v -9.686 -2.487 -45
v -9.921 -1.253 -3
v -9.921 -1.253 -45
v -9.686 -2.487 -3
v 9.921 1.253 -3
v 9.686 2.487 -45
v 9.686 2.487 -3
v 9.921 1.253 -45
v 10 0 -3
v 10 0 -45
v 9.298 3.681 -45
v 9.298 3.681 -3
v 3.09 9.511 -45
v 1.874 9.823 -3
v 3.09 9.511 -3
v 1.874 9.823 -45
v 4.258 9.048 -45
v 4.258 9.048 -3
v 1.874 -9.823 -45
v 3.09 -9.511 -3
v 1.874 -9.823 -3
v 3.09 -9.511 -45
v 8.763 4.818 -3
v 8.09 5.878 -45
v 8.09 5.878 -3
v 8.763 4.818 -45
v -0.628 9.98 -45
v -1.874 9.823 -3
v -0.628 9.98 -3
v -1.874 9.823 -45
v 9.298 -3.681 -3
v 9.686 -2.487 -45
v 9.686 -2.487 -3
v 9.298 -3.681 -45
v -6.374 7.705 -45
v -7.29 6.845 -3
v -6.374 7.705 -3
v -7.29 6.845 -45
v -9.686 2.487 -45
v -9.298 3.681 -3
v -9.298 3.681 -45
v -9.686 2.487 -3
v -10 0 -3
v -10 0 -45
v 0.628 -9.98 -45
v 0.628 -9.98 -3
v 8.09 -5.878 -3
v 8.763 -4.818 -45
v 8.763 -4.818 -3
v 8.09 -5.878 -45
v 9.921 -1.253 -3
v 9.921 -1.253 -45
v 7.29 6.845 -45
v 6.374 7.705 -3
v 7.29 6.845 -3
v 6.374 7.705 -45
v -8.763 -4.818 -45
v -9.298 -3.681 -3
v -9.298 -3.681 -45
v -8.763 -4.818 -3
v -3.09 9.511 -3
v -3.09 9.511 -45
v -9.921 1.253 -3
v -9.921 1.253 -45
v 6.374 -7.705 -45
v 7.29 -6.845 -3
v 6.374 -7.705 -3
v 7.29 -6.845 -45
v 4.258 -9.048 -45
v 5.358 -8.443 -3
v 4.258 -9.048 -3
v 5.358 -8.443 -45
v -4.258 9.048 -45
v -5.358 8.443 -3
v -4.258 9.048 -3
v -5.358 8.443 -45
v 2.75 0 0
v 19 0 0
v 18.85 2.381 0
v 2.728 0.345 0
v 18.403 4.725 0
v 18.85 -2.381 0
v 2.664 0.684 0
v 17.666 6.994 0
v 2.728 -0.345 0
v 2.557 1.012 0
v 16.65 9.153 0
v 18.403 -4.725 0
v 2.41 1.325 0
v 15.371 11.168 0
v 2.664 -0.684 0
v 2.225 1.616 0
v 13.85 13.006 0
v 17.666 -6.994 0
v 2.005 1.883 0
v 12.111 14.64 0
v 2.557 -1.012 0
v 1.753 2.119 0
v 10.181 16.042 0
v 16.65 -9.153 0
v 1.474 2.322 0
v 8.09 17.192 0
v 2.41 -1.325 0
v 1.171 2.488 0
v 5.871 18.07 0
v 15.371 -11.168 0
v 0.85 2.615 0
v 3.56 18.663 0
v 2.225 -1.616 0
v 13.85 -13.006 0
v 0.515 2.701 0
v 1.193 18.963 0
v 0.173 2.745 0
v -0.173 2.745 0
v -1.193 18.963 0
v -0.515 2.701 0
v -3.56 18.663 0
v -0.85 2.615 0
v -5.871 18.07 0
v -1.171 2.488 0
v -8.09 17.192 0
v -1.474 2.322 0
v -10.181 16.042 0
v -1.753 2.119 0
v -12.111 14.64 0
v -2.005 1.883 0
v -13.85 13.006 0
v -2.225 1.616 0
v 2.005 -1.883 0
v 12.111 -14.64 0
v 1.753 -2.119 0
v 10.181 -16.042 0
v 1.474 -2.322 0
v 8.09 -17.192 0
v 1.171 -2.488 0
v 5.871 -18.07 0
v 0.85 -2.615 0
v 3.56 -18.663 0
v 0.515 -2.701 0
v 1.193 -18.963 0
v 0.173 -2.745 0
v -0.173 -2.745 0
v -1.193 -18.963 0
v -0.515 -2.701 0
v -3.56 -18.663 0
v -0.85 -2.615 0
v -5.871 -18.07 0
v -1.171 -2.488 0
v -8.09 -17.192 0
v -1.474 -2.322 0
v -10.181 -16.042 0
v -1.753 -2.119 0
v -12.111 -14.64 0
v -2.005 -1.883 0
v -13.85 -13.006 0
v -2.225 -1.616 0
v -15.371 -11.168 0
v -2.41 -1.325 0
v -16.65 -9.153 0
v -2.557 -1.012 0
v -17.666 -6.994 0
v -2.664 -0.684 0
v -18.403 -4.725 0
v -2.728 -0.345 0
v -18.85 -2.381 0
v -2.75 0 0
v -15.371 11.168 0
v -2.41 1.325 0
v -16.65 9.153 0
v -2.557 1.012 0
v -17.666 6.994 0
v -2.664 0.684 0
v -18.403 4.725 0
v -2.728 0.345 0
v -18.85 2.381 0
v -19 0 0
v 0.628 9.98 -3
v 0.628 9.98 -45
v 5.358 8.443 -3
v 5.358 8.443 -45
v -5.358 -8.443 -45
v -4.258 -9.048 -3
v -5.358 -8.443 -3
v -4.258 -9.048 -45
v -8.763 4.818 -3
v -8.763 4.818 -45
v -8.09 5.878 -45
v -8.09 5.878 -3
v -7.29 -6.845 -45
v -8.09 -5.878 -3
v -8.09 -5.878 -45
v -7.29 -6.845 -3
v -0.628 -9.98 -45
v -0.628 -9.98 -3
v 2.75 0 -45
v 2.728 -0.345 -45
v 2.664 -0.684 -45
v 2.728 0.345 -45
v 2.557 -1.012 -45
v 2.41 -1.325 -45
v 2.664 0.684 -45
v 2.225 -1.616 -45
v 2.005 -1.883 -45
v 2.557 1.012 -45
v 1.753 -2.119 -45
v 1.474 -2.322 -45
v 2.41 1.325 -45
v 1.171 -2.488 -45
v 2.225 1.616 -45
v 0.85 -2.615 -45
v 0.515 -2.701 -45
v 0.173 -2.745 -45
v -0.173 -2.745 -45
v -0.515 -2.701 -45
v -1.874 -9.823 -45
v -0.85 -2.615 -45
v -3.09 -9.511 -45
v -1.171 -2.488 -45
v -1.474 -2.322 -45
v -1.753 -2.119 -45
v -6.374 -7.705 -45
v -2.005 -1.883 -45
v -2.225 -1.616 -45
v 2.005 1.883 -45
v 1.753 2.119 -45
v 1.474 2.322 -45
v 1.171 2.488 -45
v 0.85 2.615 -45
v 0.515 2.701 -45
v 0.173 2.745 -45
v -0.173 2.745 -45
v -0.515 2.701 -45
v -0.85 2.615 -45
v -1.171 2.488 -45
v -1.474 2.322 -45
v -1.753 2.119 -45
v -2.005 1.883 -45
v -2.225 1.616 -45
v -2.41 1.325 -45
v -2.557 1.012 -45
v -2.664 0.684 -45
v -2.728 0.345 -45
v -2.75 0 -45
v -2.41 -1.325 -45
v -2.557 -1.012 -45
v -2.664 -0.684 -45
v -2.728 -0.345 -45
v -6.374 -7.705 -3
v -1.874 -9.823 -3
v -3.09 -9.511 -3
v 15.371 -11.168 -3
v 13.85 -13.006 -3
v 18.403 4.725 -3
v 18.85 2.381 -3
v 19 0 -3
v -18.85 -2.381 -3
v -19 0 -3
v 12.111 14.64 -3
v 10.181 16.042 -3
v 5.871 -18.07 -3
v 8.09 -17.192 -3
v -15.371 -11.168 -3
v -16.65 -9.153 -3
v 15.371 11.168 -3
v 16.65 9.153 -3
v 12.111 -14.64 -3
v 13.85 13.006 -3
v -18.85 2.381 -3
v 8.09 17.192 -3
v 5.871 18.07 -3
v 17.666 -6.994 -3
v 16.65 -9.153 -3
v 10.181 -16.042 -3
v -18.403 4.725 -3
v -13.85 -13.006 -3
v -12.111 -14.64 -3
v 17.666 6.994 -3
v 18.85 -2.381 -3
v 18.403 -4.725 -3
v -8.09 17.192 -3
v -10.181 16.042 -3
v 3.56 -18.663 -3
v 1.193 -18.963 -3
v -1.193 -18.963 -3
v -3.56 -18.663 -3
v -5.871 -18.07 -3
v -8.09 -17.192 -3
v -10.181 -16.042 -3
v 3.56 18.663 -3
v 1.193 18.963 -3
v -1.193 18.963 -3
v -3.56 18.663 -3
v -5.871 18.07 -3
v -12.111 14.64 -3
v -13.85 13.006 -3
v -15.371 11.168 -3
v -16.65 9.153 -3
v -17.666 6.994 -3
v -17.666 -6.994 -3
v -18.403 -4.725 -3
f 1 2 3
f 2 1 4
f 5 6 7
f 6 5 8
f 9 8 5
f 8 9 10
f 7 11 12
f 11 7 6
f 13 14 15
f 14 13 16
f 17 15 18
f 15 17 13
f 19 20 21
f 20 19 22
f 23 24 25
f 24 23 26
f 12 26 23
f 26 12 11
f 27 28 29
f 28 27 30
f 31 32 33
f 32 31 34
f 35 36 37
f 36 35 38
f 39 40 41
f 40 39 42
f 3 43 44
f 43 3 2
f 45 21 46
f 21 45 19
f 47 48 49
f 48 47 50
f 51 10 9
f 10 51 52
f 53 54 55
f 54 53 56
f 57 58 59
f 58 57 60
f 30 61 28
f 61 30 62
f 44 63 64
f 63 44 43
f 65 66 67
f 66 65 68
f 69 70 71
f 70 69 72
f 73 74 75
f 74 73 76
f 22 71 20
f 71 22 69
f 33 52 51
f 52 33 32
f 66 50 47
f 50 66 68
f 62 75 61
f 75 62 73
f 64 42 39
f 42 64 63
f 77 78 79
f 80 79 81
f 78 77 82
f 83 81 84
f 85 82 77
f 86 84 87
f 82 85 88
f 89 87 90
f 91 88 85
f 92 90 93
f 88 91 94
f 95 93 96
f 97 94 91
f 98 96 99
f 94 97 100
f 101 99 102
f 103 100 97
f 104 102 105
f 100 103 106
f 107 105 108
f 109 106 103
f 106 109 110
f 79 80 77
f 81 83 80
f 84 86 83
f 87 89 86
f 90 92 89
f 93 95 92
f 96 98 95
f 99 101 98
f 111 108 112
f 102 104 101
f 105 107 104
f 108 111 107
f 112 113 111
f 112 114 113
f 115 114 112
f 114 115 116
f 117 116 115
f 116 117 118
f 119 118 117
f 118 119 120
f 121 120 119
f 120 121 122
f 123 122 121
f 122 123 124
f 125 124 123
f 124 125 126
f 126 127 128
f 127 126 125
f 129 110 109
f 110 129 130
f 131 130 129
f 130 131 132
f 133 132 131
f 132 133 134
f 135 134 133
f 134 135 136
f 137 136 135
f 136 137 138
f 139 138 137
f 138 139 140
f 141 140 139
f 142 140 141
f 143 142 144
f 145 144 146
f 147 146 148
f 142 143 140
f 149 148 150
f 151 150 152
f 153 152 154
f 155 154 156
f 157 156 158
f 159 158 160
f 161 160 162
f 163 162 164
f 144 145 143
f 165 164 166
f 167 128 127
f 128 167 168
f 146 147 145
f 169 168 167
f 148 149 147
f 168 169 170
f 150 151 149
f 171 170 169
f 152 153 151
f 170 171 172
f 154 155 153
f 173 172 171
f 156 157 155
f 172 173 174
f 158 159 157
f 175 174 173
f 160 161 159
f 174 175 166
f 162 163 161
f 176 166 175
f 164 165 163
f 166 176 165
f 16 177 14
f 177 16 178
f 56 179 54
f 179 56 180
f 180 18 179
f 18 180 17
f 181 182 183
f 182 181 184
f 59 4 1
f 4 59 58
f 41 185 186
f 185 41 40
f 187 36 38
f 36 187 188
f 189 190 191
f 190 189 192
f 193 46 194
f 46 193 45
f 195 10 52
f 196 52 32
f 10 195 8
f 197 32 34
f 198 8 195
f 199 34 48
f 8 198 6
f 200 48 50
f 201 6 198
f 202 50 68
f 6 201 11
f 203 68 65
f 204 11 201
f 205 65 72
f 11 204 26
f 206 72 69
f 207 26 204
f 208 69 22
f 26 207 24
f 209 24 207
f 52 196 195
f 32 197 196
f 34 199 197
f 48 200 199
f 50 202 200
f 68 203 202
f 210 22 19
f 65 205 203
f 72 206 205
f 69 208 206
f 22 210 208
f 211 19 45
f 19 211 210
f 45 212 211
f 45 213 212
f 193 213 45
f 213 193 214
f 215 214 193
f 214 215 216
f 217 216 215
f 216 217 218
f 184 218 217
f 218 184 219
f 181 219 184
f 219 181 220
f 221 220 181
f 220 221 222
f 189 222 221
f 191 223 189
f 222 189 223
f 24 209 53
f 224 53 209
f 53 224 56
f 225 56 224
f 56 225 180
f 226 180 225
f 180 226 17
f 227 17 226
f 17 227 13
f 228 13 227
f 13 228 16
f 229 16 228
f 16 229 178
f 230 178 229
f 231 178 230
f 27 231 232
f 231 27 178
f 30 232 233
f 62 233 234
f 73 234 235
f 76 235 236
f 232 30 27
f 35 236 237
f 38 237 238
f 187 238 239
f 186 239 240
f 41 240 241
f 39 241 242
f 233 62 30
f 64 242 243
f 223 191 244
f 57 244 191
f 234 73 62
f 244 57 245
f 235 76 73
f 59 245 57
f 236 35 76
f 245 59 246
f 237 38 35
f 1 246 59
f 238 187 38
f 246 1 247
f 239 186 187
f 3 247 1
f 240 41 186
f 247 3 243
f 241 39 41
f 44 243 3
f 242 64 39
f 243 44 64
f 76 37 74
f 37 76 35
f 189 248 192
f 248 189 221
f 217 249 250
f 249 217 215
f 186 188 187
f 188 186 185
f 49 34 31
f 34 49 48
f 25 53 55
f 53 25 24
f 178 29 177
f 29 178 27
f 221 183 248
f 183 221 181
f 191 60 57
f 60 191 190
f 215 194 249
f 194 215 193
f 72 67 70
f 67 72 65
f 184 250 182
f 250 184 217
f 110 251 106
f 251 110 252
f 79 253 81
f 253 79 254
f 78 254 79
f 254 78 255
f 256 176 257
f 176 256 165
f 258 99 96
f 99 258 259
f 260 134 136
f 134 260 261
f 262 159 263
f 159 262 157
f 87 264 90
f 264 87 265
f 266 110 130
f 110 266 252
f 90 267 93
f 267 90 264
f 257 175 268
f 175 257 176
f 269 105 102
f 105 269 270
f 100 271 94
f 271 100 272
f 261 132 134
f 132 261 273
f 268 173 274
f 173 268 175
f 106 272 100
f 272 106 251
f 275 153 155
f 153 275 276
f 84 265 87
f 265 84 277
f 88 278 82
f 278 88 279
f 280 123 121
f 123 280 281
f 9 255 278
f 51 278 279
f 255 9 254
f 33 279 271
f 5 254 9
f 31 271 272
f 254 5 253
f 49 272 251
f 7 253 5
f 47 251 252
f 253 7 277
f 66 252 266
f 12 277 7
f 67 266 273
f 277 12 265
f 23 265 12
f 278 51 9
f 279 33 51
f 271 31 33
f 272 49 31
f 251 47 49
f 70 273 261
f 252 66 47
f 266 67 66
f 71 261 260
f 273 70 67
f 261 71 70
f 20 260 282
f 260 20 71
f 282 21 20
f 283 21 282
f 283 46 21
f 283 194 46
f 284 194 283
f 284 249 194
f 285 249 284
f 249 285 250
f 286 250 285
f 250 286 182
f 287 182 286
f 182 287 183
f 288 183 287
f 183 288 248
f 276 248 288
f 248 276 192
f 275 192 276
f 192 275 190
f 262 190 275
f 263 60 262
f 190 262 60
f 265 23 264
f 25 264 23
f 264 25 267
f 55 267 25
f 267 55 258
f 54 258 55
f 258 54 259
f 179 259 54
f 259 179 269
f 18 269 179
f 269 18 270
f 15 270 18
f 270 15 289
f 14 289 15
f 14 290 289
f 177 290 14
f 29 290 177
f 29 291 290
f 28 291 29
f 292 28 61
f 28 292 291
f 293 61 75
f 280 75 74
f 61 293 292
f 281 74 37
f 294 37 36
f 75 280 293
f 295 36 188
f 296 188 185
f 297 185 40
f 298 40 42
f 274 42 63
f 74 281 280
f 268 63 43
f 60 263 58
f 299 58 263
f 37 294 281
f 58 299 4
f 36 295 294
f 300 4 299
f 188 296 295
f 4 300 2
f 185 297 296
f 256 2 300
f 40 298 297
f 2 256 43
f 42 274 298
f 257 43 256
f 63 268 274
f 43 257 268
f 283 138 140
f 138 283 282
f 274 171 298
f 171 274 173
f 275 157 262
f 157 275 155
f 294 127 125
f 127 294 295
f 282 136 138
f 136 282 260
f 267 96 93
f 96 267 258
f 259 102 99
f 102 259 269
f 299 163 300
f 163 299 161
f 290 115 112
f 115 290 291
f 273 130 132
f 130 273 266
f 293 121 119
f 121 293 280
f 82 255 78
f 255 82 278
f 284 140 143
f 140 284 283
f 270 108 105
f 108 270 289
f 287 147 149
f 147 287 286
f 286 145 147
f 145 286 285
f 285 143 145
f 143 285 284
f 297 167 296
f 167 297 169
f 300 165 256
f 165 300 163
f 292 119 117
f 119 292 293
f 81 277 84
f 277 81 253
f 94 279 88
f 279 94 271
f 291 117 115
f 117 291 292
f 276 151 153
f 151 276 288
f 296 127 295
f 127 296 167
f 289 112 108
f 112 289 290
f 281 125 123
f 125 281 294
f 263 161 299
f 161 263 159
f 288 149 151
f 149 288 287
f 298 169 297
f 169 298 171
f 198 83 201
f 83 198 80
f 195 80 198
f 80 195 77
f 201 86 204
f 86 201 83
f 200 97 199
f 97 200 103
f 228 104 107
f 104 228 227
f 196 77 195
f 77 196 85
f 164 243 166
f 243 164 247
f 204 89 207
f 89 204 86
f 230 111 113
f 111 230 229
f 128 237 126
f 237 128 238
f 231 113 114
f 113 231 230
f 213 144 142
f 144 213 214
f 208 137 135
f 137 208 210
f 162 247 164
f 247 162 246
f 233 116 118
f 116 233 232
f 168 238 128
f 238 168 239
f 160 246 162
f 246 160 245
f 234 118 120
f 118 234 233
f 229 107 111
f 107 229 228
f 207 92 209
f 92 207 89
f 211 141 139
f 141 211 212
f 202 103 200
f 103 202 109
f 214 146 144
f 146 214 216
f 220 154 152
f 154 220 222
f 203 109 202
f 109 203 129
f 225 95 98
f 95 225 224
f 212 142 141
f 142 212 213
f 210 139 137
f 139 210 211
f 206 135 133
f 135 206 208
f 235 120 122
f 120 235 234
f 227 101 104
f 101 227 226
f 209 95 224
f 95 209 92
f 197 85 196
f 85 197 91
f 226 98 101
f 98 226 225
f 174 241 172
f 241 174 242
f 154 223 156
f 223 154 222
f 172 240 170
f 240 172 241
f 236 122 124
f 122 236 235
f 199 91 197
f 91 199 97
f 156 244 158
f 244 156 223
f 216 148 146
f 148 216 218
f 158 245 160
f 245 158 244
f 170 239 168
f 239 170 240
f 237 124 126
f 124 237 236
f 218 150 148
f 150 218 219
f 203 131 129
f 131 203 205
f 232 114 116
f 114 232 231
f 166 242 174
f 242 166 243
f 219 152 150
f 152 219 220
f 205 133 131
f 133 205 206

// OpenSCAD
$fn = 50;


difference() {
	union() {
		translate(v = [0, 0, -45.0000000000]) {
			cylinder(h = 45, r = 10.0000000000);
		}
		translate(v = [0, 0, -3.0000000000]) {
			cylinder(h = 3, r = 19.0000000000);
		}
	}
	union() {
		#translate(v = [0, 0, -45]) {
			cylinder(h = 45, r = 2.7500000000);
		}
	}
}
